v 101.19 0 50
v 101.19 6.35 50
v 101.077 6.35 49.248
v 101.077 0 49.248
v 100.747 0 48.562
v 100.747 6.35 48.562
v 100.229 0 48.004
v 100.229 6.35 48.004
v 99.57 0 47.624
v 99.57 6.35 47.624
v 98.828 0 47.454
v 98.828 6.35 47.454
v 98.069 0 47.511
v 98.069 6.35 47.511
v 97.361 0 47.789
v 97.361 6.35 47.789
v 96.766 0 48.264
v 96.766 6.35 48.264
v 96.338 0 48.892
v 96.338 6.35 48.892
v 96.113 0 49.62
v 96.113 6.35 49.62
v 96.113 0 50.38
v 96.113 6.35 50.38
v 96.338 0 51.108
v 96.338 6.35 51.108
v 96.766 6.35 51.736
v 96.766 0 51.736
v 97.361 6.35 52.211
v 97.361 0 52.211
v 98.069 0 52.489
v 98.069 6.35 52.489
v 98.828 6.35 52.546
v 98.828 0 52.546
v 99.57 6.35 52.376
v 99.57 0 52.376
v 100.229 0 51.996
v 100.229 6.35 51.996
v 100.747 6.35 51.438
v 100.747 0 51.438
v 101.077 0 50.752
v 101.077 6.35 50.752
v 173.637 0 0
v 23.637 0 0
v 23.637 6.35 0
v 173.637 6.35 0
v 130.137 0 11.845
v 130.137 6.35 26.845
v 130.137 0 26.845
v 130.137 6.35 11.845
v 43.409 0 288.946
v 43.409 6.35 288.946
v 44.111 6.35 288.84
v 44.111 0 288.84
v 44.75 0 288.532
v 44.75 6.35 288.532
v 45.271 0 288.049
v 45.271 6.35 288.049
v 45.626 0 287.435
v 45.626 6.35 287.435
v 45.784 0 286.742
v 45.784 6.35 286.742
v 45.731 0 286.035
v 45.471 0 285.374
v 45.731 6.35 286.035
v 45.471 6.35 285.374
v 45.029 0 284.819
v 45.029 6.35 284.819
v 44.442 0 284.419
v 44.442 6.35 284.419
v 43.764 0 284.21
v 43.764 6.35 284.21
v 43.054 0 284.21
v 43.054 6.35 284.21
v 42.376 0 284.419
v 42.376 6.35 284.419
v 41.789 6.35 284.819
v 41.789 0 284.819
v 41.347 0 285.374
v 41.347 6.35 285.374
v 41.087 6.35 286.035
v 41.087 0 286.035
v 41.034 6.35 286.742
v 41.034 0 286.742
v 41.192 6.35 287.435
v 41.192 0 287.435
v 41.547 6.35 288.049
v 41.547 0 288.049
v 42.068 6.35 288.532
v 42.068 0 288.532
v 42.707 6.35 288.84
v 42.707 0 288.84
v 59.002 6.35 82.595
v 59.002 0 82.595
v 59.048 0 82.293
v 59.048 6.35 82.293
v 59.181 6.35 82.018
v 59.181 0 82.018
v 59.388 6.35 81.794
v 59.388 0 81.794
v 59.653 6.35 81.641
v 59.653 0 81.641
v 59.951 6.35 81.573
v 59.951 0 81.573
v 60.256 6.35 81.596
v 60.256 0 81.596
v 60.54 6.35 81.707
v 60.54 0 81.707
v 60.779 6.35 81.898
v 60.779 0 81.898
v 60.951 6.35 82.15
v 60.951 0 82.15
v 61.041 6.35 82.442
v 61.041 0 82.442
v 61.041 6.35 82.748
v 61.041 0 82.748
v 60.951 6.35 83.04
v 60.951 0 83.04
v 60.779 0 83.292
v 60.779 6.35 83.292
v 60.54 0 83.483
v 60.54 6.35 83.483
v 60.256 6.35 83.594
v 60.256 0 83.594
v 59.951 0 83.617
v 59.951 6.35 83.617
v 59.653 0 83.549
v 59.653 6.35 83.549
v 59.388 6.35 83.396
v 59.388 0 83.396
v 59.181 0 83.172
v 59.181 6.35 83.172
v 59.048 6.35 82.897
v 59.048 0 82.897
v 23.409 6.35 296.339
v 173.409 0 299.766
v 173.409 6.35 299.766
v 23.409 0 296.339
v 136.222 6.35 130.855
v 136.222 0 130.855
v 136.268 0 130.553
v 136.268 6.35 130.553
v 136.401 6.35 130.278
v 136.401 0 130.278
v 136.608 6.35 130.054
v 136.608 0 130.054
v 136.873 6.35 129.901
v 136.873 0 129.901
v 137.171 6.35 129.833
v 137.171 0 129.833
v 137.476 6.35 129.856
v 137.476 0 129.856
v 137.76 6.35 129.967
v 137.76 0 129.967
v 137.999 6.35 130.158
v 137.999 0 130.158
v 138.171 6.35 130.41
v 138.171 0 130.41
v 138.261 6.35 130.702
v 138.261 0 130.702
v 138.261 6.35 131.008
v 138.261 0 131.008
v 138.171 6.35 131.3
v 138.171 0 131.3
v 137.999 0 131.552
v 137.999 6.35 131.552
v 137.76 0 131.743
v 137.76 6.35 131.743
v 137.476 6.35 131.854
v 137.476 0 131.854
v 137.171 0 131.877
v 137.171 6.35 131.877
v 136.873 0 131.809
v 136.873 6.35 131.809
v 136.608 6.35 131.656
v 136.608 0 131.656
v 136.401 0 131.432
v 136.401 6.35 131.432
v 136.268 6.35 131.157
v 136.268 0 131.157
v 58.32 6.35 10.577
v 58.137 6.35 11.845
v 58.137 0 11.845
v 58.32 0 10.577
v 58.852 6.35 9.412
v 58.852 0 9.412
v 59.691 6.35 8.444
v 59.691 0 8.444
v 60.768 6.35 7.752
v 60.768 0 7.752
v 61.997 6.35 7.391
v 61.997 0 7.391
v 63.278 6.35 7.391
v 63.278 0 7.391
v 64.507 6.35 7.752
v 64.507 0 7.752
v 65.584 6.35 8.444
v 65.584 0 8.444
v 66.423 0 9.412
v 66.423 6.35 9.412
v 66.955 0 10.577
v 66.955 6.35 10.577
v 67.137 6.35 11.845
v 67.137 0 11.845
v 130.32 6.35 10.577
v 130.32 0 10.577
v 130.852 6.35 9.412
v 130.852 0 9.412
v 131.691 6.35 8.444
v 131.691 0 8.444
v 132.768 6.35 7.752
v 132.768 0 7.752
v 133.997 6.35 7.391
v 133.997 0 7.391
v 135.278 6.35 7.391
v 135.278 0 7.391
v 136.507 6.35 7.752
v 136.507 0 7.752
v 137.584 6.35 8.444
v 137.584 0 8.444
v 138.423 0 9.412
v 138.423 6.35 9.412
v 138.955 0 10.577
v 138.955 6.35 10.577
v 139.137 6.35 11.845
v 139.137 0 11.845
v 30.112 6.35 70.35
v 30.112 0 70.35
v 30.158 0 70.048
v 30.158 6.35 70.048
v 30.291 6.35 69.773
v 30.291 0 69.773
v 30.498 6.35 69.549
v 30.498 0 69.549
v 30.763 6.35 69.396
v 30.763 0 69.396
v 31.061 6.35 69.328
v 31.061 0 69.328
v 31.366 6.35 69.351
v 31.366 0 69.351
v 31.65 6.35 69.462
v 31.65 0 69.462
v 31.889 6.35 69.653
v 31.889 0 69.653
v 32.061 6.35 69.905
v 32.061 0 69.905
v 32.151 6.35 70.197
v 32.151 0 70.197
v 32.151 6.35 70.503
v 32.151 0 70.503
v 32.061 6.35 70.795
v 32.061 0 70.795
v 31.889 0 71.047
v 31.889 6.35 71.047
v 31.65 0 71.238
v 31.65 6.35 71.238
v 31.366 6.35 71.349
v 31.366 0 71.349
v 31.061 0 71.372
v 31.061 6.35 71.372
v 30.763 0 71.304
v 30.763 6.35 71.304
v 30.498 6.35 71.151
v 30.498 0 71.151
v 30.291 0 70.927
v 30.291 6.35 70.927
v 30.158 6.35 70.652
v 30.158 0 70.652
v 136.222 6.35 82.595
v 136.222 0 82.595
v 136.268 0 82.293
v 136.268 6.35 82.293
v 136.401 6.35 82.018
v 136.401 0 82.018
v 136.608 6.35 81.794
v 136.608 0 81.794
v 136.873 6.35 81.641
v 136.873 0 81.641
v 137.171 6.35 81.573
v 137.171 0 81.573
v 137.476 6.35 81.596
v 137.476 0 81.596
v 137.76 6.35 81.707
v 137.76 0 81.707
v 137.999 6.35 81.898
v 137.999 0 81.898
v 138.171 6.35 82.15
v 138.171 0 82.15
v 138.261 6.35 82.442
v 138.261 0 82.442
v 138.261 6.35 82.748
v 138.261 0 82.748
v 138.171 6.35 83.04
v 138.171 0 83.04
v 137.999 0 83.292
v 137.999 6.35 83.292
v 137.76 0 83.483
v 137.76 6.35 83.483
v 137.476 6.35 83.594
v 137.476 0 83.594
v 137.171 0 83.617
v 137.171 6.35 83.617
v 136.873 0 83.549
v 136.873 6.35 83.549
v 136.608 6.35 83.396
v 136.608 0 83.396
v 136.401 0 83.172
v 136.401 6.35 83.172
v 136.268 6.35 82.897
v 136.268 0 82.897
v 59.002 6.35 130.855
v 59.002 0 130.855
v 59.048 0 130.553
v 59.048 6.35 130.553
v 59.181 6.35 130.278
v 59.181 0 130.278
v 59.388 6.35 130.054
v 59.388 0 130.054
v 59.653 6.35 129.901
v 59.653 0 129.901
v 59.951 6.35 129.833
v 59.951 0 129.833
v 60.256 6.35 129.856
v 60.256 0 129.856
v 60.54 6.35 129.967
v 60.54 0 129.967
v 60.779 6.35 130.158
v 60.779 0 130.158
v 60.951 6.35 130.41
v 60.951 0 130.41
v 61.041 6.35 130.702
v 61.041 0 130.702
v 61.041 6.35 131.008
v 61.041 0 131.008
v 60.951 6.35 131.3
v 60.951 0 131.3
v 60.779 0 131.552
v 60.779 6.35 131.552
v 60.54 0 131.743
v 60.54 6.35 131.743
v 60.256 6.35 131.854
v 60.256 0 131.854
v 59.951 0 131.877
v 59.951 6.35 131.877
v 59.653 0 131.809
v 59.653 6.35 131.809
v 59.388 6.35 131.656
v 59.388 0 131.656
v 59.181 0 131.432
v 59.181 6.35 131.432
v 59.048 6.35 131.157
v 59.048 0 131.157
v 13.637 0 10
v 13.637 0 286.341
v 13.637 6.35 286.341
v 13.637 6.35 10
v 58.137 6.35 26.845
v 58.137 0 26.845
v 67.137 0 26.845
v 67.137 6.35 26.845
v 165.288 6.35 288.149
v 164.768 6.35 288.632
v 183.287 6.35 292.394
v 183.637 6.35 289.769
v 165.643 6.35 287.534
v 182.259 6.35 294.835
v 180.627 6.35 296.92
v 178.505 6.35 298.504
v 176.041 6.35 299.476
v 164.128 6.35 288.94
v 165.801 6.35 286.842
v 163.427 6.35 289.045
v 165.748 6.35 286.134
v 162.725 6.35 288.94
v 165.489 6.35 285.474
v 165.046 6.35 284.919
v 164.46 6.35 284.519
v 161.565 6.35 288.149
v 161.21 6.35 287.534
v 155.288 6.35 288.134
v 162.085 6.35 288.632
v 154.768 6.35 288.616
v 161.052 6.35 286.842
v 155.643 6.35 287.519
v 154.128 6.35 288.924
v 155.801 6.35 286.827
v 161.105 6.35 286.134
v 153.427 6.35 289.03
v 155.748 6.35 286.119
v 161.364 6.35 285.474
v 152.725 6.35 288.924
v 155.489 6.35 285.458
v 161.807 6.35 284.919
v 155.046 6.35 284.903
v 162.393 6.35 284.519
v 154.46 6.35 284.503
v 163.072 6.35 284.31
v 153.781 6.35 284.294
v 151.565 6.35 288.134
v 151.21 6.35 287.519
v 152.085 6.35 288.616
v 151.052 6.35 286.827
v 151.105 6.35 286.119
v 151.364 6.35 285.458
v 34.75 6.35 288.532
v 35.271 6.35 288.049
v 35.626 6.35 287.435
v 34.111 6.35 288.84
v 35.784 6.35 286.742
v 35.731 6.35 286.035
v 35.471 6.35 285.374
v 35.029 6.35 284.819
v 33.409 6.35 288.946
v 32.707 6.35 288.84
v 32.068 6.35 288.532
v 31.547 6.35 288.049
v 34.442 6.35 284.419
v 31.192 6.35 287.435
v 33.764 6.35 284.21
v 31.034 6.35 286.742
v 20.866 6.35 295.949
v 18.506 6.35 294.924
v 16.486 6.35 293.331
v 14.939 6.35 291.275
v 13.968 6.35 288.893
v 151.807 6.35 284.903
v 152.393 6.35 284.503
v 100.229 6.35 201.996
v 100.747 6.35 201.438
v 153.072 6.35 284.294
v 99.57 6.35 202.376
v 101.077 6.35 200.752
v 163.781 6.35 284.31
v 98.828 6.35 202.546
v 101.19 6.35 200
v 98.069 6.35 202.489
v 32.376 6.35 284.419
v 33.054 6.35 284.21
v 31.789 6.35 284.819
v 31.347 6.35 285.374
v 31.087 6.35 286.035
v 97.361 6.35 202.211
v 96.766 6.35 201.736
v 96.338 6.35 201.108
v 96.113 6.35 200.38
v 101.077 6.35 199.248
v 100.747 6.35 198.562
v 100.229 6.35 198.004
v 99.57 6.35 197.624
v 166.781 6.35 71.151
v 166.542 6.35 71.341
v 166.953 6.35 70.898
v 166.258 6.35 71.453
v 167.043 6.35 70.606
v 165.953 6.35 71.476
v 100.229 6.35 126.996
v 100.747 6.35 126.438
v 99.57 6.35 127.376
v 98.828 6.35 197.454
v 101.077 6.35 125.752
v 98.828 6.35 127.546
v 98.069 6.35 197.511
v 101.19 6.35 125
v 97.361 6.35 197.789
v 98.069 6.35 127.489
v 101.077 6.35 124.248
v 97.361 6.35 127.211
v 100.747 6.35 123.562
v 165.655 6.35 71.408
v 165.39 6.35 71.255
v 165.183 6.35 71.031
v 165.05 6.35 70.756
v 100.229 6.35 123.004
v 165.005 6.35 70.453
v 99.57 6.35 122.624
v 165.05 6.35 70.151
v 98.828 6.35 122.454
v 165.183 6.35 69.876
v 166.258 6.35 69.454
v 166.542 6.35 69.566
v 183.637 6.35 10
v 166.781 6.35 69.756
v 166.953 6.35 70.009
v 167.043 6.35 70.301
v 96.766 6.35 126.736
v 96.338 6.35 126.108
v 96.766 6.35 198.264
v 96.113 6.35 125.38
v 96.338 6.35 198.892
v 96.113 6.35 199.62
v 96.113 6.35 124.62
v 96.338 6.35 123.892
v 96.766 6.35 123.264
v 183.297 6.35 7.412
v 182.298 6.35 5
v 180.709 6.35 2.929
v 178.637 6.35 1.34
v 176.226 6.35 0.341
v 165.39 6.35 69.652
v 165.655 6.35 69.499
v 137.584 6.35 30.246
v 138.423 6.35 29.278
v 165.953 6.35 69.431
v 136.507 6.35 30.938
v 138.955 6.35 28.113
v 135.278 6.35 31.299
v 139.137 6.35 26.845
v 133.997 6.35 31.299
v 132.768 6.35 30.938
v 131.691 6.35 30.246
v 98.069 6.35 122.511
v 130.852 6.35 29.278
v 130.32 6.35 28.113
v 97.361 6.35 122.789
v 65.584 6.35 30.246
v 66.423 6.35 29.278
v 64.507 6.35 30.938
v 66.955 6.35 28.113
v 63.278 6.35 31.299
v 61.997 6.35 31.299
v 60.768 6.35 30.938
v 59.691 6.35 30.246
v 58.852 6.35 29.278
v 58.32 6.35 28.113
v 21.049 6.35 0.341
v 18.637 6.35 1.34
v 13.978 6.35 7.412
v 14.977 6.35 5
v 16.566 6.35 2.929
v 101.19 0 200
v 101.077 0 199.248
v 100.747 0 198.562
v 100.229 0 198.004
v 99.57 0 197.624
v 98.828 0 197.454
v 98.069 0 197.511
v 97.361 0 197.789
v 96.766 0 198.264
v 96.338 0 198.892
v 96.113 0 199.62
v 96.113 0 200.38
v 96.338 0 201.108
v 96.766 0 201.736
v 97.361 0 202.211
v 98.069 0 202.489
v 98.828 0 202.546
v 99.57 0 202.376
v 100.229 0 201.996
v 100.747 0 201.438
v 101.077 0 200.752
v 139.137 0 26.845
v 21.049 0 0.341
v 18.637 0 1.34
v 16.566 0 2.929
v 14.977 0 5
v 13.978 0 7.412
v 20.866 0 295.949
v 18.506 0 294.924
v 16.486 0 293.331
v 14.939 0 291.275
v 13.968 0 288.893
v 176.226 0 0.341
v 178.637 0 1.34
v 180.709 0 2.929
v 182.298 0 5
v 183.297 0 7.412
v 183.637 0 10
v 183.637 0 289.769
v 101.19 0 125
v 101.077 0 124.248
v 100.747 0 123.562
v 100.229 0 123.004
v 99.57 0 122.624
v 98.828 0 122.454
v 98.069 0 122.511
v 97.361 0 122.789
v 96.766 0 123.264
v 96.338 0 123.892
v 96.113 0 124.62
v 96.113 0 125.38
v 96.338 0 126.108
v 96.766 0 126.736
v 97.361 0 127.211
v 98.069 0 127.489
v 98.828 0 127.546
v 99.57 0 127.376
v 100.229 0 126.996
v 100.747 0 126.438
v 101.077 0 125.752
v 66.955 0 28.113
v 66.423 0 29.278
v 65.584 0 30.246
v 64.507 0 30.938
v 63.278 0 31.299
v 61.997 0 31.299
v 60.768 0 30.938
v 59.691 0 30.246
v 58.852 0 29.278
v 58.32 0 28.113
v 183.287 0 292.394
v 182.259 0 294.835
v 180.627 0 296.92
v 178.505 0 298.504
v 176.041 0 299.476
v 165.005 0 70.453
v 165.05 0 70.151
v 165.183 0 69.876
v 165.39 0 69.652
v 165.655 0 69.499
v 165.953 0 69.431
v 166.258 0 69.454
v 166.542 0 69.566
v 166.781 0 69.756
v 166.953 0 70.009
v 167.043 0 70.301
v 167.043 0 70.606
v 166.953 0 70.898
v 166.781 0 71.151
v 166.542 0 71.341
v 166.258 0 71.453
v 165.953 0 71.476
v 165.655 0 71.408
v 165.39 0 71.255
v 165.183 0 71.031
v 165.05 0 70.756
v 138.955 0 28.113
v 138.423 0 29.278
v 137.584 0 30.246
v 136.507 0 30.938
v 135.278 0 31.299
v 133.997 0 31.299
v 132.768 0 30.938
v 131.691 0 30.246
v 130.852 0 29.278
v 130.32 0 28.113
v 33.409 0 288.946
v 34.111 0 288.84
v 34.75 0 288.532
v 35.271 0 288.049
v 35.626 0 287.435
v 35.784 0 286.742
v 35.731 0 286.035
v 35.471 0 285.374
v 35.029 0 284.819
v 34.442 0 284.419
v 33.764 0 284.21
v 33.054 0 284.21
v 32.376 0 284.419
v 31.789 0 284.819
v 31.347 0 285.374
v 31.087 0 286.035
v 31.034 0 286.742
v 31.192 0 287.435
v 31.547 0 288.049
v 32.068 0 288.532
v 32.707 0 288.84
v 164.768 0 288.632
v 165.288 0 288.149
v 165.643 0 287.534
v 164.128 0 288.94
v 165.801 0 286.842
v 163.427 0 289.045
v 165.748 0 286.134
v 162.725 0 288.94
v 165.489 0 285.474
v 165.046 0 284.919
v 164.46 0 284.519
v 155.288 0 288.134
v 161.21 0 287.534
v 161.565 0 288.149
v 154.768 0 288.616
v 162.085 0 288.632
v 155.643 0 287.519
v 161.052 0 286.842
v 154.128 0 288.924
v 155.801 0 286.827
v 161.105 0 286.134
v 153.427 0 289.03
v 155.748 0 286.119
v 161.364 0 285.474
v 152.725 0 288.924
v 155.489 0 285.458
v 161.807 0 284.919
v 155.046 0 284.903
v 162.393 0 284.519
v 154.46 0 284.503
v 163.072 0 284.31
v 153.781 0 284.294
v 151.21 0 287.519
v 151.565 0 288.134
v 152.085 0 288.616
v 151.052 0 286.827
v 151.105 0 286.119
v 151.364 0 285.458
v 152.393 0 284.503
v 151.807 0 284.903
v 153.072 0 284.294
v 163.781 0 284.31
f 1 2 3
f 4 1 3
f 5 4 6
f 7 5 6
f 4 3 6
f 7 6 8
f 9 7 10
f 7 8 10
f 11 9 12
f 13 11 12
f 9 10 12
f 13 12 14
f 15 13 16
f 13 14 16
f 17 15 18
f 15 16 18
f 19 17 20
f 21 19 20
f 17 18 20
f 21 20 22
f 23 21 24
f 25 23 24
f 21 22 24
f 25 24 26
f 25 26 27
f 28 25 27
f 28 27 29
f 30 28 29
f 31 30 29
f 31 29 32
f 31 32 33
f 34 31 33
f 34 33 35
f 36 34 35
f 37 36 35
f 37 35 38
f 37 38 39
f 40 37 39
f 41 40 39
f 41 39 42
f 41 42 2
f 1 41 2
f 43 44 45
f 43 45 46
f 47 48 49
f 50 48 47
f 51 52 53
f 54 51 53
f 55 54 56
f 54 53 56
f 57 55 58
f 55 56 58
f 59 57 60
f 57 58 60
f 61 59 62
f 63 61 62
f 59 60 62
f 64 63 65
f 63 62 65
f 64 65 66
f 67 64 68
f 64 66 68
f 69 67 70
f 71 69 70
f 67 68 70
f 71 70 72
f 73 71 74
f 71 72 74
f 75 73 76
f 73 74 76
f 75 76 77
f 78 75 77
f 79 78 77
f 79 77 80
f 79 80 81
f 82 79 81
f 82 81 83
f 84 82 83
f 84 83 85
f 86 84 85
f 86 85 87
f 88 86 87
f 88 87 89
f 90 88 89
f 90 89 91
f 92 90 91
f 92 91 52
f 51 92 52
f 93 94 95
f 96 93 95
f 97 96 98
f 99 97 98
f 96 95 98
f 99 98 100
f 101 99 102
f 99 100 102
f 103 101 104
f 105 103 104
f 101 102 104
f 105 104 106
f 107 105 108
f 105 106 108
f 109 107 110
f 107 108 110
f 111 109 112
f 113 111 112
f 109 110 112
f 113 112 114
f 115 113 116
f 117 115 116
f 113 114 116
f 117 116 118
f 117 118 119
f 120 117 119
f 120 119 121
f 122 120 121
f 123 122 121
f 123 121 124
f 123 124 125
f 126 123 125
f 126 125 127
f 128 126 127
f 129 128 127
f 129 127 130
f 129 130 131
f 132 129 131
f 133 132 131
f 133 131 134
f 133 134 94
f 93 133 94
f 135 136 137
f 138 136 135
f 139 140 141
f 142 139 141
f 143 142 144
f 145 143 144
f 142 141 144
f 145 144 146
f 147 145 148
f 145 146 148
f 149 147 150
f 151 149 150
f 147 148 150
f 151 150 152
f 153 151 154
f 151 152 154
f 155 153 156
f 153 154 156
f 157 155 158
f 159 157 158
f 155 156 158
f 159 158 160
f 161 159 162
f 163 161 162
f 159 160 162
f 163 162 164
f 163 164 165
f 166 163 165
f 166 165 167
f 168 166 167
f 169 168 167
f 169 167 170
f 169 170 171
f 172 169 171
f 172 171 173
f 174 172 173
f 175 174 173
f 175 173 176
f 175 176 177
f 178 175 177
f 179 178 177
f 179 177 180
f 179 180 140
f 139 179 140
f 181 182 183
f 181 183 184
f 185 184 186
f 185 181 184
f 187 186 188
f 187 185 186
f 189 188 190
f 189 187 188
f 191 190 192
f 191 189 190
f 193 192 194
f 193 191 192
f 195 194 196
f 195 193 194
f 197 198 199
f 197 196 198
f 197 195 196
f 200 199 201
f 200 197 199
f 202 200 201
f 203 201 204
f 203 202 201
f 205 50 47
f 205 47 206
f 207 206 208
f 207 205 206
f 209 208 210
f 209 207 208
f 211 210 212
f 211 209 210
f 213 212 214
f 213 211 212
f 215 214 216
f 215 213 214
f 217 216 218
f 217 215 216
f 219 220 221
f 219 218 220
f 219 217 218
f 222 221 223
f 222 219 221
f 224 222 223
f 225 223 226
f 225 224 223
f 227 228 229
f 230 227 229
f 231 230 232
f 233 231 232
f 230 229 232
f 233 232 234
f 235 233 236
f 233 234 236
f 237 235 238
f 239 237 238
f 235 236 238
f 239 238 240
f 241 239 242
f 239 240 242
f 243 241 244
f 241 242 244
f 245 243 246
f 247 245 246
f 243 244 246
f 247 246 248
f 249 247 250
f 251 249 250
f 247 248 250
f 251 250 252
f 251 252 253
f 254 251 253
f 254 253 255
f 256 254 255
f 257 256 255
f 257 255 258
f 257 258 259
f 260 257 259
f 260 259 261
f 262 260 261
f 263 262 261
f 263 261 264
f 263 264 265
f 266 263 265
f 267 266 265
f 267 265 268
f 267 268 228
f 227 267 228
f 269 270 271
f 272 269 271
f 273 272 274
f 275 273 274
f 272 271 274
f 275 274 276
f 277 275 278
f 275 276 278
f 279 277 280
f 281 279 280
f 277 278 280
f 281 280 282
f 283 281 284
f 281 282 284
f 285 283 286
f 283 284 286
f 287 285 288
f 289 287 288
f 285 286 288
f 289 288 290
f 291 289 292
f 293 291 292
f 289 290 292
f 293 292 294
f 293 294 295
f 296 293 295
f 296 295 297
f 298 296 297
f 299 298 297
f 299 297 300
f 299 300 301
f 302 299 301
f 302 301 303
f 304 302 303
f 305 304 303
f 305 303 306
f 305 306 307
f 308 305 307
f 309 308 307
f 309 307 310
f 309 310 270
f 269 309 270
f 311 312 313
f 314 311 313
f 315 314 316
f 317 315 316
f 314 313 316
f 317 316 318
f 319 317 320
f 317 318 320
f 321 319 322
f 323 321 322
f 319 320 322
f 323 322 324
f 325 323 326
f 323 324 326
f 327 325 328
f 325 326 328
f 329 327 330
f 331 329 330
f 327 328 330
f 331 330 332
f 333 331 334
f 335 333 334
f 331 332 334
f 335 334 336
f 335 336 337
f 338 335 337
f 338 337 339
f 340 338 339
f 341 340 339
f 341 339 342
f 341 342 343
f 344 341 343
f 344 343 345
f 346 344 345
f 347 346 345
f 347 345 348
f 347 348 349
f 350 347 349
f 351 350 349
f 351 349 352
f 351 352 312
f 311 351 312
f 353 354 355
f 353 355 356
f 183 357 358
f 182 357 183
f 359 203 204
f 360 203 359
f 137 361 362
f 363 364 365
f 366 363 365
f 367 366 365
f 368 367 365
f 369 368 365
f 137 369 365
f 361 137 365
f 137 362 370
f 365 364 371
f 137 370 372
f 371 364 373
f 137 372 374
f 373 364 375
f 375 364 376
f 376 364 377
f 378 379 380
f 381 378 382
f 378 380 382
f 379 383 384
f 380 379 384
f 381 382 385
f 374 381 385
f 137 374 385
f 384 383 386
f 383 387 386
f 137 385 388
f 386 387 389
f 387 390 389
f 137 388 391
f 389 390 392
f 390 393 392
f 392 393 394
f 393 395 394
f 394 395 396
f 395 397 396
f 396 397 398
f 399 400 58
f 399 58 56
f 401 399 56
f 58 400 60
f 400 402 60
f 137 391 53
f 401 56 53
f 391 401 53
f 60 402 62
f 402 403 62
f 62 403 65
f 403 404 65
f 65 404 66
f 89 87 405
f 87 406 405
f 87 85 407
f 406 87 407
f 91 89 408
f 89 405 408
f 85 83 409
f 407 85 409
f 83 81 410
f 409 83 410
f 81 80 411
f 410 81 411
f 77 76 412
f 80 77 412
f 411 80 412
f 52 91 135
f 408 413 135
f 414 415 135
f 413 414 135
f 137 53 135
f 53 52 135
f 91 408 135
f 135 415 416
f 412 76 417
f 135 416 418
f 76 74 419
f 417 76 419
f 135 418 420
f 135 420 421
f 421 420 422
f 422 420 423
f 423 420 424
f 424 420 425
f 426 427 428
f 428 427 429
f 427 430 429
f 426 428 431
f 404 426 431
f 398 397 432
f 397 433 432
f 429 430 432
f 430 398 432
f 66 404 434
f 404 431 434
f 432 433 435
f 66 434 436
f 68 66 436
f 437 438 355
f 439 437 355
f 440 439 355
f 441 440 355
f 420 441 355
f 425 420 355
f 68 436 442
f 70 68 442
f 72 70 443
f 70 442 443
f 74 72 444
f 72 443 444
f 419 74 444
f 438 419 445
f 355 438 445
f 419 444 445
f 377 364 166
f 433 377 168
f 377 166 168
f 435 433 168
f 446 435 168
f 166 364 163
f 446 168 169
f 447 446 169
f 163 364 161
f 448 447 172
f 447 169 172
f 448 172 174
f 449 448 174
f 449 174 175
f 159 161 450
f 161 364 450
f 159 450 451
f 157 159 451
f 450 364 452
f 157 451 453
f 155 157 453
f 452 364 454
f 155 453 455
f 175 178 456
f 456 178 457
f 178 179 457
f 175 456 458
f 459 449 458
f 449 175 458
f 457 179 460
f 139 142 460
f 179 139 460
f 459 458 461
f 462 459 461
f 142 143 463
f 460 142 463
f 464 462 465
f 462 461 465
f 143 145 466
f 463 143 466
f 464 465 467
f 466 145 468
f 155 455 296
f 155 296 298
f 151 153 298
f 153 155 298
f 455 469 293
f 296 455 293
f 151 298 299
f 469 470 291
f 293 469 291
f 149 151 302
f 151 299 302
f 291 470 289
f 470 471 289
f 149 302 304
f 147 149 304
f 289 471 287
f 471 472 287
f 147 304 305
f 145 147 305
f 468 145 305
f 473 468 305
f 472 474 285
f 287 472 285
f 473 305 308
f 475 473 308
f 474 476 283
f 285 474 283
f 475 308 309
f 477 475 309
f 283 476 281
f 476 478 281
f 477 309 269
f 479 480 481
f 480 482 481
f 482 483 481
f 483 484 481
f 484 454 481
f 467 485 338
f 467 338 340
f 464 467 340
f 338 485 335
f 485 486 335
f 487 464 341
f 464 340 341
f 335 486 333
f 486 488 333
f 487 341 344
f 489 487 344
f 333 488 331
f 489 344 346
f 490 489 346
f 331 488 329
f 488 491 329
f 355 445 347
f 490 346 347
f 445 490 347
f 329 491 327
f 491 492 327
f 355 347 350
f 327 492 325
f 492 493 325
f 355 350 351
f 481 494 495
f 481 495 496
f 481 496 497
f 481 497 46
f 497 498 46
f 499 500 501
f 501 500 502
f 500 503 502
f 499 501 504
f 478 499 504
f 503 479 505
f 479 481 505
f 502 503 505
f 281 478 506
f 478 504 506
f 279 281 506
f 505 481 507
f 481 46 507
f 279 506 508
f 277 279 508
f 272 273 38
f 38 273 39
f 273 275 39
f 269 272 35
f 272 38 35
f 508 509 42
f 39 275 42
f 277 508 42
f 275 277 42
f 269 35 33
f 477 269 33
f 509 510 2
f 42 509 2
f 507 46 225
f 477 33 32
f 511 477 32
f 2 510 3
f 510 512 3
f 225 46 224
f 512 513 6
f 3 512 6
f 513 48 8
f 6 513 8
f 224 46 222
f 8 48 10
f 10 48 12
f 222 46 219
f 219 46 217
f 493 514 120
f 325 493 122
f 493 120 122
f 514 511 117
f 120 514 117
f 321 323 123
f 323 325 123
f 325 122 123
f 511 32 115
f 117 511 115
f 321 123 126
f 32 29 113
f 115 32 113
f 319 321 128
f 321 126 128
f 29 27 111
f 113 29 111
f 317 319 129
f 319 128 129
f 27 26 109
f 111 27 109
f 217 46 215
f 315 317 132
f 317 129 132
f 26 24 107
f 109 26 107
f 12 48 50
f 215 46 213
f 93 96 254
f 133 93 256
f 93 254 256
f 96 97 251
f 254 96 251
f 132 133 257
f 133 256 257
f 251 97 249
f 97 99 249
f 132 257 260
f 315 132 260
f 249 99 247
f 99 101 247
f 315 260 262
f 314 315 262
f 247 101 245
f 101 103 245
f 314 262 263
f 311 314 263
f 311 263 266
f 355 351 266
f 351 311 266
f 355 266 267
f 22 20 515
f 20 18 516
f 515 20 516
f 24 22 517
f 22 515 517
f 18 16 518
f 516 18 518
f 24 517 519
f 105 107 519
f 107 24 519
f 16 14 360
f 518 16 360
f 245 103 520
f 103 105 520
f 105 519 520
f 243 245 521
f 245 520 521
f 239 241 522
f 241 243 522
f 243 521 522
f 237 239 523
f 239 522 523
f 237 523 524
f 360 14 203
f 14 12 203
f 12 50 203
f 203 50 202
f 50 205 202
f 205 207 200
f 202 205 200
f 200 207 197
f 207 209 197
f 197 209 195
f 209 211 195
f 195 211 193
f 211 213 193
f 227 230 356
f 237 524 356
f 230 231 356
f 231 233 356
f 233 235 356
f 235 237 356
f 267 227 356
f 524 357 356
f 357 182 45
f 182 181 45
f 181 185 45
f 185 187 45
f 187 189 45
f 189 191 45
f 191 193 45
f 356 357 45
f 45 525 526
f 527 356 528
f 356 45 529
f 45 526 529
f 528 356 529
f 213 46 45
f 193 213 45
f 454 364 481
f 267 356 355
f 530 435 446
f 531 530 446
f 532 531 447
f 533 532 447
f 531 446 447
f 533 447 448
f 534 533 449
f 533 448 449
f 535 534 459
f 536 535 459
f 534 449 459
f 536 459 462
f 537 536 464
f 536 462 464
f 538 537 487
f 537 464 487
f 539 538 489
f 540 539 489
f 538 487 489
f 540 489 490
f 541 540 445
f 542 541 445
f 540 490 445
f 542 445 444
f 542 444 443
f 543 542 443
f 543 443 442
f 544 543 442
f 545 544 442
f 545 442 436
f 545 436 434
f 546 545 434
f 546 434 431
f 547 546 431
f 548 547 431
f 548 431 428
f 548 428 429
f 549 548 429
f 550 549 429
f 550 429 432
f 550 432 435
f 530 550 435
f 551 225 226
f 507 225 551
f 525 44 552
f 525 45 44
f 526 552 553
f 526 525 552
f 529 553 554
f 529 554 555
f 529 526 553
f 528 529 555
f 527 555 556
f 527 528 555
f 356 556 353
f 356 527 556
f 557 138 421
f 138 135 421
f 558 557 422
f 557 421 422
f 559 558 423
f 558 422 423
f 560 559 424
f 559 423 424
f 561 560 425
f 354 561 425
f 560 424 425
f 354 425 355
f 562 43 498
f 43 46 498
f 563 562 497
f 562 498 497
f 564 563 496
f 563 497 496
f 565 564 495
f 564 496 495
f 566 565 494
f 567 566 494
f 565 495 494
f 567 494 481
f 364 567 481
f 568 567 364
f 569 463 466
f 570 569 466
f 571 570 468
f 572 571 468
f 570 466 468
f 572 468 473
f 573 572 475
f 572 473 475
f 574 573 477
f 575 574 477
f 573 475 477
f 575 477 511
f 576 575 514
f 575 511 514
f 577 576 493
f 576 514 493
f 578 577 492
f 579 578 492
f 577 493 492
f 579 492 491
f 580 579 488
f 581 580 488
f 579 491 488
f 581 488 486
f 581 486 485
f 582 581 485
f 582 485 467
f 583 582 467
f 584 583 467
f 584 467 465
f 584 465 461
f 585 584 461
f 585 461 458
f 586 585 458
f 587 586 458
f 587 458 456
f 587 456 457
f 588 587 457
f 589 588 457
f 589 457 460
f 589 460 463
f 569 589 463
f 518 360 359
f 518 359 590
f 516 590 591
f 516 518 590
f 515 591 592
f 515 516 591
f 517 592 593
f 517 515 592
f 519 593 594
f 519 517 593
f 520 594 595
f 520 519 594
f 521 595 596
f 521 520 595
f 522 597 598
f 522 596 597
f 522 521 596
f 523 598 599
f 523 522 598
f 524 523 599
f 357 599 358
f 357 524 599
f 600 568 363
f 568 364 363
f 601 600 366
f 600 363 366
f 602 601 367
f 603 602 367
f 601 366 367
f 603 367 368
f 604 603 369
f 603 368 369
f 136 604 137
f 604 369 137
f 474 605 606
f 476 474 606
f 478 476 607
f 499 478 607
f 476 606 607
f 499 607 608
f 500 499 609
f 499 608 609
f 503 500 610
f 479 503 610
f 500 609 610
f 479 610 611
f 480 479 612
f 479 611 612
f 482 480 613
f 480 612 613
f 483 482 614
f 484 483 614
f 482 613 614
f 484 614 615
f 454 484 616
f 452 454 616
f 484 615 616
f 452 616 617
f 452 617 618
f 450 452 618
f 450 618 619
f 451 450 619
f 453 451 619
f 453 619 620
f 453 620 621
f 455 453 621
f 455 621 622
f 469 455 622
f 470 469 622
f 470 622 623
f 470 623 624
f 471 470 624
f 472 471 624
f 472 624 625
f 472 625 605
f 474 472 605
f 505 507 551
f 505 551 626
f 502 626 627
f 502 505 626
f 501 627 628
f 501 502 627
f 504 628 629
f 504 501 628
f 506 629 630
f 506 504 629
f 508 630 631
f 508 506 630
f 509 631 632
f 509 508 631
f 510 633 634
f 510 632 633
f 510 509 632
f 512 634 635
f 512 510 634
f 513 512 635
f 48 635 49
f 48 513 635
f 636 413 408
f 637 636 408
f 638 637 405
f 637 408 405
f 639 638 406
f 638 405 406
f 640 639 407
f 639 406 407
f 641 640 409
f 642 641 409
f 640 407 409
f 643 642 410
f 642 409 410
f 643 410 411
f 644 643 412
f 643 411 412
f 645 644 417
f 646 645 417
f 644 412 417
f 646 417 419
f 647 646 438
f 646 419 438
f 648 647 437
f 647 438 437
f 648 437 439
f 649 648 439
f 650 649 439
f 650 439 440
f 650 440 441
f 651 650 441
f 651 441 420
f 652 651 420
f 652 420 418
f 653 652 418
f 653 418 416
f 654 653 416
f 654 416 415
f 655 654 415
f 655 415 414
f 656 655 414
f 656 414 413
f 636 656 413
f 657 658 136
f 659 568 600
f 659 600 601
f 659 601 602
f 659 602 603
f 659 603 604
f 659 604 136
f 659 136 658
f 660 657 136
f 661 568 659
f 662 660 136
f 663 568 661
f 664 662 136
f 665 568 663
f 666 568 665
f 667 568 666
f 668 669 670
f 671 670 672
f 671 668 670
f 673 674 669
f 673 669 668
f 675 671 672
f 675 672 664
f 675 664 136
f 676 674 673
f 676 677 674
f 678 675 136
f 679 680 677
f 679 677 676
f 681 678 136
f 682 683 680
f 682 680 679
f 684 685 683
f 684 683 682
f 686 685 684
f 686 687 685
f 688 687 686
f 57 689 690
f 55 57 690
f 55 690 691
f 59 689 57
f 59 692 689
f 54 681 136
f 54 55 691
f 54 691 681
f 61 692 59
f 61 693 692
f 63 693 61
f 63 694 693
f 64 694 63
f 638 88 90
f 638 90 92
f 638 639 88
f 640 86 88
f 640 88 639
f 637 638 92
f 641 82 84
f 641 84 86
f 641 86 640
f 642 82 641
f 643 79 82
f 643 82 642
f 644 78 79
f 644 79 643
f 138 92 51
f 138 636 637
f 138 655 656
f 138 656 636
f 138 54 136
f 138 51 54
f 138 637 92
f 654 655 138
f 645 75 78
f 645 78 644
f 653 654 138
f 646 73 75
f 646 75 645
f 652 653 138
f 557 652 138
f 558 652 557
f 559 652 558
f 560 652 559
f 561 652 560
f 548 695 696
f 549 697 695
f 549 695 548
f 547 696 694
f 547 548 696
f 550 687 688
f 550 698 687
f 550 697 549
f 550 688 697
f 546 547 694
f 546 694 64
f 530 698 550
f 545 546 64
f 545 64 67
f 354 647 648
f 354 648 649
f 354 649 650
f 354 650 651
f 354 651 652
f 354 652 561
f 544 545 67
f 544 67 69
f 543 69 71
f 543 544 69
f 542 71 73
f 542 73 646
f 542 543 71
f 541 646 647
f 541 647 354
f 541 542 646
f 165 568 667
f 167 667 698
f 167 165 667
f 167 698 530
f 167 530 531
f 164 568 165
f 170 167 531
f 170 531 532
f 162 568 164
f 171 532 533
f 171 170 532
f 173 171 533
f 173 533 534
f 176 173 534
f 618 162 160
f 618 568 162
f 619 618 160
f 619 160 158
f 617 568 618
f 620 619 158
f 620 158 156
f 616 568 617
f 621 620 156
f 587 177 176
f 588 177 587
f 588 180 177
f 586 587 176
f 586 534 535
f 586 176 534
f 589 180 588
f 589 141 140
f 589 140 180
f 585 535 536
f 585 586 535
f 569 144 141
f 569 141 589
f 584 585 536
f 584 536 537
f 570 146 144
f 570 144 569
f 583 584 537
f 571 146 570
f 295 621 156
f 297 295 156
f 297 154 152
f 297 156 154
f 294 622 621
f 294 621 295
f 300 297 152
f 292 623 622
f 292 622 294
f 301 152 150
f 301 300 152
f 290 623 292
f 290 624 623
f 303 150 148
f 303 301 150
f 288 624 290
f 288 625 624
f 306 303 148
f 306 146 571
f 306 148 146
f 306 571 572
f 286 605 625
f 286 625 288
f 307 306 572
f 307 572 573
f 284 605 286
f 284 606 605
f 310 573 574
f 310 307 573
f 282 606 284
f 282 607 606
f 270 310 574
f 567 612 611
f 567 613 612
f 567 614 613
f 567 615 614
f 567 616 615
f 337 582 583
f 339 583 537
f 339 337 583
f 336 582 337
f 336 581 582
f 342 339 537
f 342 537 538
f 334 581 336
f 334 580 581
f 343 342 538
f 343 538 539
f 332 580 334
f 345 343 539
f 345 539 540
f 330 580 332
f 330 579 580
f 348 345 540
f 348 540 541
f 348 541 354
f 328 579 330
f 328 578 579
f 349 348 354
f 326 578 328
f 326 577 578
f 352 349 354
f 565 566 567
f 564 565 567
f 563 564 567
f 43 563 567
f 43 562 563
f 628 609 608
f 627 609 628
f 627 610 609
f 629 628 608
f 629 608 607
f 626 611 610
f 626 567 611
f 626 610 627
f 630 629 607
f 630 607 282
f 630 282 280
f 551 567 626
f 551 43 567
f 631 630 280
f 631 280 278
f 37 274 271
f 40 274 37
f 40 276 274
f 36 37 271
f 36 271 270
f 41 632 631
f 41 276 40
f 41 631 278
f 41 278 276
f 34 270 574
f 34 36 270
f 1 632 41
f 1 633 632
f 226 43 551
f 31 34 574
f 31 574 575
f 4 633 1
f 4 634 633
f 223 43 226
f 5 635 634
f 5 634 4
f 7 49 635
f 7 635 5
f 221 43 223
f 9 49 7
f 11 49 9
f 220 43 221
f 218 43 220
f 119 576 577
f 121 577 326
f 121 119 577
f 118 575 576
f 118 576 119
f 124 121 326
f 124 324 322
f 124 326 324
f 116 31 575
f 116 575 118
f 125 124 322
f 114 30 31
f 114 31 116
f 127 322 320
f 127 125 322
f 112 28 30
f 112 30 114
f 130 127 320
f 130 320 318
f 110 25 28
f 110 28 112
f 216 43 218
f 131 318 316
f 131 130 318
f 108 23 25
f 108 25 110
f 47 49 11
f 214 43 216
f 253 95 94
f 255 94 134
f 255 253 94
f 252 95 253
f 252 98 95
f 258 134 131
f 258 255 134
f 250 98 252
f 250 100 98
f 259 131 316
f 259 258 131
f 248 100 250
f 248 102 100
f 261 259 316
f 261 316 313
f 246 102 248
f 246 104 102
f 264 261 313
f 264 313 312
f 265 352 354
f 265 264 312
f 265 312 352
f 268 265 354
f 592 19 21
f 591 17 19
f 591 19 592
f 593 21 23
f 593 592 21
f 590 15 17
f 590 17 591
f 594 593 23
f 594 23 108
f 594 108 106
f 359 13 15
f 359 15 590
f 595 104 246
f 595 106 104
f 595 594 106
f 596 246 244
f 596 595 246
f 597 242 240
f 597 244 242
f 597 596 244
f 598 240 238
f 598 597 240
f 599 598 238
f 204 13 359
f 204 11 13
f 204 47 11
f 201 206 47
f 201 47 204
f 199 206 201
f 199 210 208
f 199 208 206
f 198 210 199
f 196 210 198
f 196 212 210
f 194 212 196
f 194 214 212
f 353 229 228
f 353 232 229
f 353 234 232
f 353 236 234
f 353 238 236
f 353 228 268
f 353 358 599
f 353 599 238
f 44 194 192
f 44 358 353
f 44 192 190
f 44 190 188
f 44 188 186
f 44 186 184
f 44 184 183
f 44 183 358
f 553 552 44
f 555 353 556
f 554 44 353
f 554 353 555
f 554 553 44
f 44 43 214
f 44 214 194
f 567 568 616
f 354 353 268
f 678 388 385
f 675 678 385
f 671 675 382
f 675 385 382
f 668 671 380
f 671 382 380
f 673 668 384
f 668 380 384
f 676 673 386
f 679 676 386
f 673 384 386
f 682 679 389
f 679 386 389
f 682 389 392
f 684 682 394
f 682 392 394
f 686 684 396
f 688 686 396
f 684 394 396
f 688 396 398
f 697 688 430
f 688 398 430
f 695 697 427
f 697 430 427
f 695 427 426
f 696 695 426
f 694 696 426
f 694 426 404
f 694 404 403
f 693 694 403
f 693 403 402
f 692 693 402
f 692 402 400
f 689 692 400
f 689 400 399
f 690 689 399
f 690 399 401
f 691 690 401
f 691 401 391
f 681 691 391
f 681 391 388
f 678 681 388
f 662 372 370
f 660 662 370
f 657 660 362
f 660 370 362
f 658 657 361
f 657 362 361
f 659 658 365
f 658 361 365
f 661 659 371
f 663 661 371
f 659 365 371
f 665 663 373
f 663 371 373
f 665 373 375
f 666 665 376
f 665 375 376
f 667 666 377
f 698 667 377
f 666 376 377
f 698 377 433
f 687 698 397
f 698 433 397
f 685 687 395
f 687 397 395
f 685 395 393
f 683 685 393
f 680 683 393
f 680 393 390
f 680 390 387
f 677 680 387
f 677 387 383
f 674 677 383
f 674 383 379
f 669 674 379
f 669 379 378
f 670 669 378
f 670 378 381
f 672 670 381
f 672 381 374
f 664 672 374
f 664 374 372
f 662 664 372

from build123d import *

# Parameters (mm, degrees)
PLATE_DEPTH                          = 6.35
FILLET1_R                            = 10
TRIPOD_SOCKET_TAP_DRILL_FOR_1_4_20_D = 5.1054
CAMERA_MOUNT_SCREW_CLEARANCE_DEPTH   = 352.602633461
ALIGNMENT_TAP_DRILL_FOR_M2_5_D       = 2.05
CLAMP_TAP_DRILL_FOR_M2_5_D           = 2.05
SKETCH11_R                           = 2.38125
CABLE_TIES_HOLES_DEPTH               = 352.602633461


with BuildPart() as part:
    # Sketch1 → plate (new body)
    with BuildSketch(Plane(origin=(0, 0, 0), x_dir=(1, 0, 0), z_dir=(0, 1, 0))):
        Polygon((13.637433785, 0), (183.637433785, 0), (183.637433785, -300), (13.637433785, -296.115361978), align=None)
    extrude(amount=PLATE_DEPTH)

    # Fillet1
    fillet1_edges = [part.edges().sort_by_distance(p)[0] for p in [
        (13.637433785, 3.175, 0),
        (183.637433785, 3.175, 0),
        (183.637433785, 3.175, 300),
        (13.637433785, 3.175, 296.115361978),
    ]]
    fillet(fillet1_edges, radius=FILLET1_R)

    # tripod socket Tap Drill for 1/4-20 (through all)
    with Locations(Plane(origin=(0, 0, 0), x_dir=(-1, 0, 0), z_dir=(0, -1, 0))):
        with Locations((-98.637433785, -50), (-98.637433785, -125), (-98.637433785, -200)):
            Hole(TRIPOD_SOCKET_TAP_DRILL_FOR_1_4_20_D / 2)

    # Sketch6 → camera mount screw clearance (cut, through all)
    with BuildSketch(Plane(origin=(0, 6.35, 0), x_dir=(1, 0, 0), z_dir=(0, 1, 0))):
        with BuildLine():
            Line((130.137433785, -26.845059814), (130.137433785, -11.845059814))
            ThreePointArc((130.137433785, -11.845059814), (134.637433785, -7.345059814), (139.137433785, -11.845059814))
            Line((139.137433785, -11.845059814), (139.137433785, -26.845059814))
            ThreePointArc((139.137433785, -26.845059814), (134.637433785, -31.345059814), (130.137433785, -26.845059814))
        make_face()
        with BuildLine():
            Line((58.137433785, -26.845059814), (58.137433785, -11.845059814))
            ThreePointArc((58.137433785, -11.845059814), (62.637433785, -7.345059814), (67.137433785, -11.845059814))
            Line((67.137433785, -11.845059814), (67.137433785, -26.845059814))
            ThreePointArc((67.137433785, -26.845059814), (62.637433785, -31.345059814), (58.137433785, -26.845059814))
        make_face()
    extrude(amount=-CAMERA_MOUNT_SCREW_CLEARANCE_DEPTH, mode=Mode.SUBTRACT)

    # alignment Tap Drill for M2.5 (through all)
    with Locations(Plane(origin=(0, 6.35, 0), x_dir=(1, 0, 0), z_dir=(0, 1, 0))):
        with Locations((60.027433785, -82.595059814), (137.247433785, -82.595059814), (137.247433785, -130.855059814), (60.027433785, -130.855059814)):
            Hole(ALIGNMENT_TAP_DRILL_FOR_M2_5_D / 2)

    # clamp Tap Drill for M2.5 (through all)
    with Locations(Plane(origin=(0, 6.35, 0), x_dir=(1, 0, 0), z_dir=(0, 1, 0))):
        with Locations((31.137433785, -70.35), (166.029512109, -70.453390828)):
            Hole(CLAMP_TAP_DRILL_FOR_M2_5_D / 2)

    # Sketch11 → cable ties holes (cut, through all)
    with BuildSketch(Plane(origin=(0, 6.35, 0), x_dir=(1, 0, 0), z_dir=(0, 1, 0))):
        with Locations(Location((33.408985301, -286.564547525, 0), (0, 0, 270))):
            Circle(SKETCH11_R)
        with Locations(Location((43.408985301, -286.564547525, 0), (0, 0, 270))):
            Circle(SKETCH11_R)
        with Locations(Location((153.426530966, -286.648872752, 0), (0, 0, 270))):
            Circle(SKETCH11_R)
        with Locations(Location((163.426519217, -286.664202157, 0), (0, 0, 270))):
            Circle(SKETCH11_R)
    extrude(amount=-CABLE_TIES_HOLES_DEPTH, mode=Mode.SUBTRACT)


solid = part.part
